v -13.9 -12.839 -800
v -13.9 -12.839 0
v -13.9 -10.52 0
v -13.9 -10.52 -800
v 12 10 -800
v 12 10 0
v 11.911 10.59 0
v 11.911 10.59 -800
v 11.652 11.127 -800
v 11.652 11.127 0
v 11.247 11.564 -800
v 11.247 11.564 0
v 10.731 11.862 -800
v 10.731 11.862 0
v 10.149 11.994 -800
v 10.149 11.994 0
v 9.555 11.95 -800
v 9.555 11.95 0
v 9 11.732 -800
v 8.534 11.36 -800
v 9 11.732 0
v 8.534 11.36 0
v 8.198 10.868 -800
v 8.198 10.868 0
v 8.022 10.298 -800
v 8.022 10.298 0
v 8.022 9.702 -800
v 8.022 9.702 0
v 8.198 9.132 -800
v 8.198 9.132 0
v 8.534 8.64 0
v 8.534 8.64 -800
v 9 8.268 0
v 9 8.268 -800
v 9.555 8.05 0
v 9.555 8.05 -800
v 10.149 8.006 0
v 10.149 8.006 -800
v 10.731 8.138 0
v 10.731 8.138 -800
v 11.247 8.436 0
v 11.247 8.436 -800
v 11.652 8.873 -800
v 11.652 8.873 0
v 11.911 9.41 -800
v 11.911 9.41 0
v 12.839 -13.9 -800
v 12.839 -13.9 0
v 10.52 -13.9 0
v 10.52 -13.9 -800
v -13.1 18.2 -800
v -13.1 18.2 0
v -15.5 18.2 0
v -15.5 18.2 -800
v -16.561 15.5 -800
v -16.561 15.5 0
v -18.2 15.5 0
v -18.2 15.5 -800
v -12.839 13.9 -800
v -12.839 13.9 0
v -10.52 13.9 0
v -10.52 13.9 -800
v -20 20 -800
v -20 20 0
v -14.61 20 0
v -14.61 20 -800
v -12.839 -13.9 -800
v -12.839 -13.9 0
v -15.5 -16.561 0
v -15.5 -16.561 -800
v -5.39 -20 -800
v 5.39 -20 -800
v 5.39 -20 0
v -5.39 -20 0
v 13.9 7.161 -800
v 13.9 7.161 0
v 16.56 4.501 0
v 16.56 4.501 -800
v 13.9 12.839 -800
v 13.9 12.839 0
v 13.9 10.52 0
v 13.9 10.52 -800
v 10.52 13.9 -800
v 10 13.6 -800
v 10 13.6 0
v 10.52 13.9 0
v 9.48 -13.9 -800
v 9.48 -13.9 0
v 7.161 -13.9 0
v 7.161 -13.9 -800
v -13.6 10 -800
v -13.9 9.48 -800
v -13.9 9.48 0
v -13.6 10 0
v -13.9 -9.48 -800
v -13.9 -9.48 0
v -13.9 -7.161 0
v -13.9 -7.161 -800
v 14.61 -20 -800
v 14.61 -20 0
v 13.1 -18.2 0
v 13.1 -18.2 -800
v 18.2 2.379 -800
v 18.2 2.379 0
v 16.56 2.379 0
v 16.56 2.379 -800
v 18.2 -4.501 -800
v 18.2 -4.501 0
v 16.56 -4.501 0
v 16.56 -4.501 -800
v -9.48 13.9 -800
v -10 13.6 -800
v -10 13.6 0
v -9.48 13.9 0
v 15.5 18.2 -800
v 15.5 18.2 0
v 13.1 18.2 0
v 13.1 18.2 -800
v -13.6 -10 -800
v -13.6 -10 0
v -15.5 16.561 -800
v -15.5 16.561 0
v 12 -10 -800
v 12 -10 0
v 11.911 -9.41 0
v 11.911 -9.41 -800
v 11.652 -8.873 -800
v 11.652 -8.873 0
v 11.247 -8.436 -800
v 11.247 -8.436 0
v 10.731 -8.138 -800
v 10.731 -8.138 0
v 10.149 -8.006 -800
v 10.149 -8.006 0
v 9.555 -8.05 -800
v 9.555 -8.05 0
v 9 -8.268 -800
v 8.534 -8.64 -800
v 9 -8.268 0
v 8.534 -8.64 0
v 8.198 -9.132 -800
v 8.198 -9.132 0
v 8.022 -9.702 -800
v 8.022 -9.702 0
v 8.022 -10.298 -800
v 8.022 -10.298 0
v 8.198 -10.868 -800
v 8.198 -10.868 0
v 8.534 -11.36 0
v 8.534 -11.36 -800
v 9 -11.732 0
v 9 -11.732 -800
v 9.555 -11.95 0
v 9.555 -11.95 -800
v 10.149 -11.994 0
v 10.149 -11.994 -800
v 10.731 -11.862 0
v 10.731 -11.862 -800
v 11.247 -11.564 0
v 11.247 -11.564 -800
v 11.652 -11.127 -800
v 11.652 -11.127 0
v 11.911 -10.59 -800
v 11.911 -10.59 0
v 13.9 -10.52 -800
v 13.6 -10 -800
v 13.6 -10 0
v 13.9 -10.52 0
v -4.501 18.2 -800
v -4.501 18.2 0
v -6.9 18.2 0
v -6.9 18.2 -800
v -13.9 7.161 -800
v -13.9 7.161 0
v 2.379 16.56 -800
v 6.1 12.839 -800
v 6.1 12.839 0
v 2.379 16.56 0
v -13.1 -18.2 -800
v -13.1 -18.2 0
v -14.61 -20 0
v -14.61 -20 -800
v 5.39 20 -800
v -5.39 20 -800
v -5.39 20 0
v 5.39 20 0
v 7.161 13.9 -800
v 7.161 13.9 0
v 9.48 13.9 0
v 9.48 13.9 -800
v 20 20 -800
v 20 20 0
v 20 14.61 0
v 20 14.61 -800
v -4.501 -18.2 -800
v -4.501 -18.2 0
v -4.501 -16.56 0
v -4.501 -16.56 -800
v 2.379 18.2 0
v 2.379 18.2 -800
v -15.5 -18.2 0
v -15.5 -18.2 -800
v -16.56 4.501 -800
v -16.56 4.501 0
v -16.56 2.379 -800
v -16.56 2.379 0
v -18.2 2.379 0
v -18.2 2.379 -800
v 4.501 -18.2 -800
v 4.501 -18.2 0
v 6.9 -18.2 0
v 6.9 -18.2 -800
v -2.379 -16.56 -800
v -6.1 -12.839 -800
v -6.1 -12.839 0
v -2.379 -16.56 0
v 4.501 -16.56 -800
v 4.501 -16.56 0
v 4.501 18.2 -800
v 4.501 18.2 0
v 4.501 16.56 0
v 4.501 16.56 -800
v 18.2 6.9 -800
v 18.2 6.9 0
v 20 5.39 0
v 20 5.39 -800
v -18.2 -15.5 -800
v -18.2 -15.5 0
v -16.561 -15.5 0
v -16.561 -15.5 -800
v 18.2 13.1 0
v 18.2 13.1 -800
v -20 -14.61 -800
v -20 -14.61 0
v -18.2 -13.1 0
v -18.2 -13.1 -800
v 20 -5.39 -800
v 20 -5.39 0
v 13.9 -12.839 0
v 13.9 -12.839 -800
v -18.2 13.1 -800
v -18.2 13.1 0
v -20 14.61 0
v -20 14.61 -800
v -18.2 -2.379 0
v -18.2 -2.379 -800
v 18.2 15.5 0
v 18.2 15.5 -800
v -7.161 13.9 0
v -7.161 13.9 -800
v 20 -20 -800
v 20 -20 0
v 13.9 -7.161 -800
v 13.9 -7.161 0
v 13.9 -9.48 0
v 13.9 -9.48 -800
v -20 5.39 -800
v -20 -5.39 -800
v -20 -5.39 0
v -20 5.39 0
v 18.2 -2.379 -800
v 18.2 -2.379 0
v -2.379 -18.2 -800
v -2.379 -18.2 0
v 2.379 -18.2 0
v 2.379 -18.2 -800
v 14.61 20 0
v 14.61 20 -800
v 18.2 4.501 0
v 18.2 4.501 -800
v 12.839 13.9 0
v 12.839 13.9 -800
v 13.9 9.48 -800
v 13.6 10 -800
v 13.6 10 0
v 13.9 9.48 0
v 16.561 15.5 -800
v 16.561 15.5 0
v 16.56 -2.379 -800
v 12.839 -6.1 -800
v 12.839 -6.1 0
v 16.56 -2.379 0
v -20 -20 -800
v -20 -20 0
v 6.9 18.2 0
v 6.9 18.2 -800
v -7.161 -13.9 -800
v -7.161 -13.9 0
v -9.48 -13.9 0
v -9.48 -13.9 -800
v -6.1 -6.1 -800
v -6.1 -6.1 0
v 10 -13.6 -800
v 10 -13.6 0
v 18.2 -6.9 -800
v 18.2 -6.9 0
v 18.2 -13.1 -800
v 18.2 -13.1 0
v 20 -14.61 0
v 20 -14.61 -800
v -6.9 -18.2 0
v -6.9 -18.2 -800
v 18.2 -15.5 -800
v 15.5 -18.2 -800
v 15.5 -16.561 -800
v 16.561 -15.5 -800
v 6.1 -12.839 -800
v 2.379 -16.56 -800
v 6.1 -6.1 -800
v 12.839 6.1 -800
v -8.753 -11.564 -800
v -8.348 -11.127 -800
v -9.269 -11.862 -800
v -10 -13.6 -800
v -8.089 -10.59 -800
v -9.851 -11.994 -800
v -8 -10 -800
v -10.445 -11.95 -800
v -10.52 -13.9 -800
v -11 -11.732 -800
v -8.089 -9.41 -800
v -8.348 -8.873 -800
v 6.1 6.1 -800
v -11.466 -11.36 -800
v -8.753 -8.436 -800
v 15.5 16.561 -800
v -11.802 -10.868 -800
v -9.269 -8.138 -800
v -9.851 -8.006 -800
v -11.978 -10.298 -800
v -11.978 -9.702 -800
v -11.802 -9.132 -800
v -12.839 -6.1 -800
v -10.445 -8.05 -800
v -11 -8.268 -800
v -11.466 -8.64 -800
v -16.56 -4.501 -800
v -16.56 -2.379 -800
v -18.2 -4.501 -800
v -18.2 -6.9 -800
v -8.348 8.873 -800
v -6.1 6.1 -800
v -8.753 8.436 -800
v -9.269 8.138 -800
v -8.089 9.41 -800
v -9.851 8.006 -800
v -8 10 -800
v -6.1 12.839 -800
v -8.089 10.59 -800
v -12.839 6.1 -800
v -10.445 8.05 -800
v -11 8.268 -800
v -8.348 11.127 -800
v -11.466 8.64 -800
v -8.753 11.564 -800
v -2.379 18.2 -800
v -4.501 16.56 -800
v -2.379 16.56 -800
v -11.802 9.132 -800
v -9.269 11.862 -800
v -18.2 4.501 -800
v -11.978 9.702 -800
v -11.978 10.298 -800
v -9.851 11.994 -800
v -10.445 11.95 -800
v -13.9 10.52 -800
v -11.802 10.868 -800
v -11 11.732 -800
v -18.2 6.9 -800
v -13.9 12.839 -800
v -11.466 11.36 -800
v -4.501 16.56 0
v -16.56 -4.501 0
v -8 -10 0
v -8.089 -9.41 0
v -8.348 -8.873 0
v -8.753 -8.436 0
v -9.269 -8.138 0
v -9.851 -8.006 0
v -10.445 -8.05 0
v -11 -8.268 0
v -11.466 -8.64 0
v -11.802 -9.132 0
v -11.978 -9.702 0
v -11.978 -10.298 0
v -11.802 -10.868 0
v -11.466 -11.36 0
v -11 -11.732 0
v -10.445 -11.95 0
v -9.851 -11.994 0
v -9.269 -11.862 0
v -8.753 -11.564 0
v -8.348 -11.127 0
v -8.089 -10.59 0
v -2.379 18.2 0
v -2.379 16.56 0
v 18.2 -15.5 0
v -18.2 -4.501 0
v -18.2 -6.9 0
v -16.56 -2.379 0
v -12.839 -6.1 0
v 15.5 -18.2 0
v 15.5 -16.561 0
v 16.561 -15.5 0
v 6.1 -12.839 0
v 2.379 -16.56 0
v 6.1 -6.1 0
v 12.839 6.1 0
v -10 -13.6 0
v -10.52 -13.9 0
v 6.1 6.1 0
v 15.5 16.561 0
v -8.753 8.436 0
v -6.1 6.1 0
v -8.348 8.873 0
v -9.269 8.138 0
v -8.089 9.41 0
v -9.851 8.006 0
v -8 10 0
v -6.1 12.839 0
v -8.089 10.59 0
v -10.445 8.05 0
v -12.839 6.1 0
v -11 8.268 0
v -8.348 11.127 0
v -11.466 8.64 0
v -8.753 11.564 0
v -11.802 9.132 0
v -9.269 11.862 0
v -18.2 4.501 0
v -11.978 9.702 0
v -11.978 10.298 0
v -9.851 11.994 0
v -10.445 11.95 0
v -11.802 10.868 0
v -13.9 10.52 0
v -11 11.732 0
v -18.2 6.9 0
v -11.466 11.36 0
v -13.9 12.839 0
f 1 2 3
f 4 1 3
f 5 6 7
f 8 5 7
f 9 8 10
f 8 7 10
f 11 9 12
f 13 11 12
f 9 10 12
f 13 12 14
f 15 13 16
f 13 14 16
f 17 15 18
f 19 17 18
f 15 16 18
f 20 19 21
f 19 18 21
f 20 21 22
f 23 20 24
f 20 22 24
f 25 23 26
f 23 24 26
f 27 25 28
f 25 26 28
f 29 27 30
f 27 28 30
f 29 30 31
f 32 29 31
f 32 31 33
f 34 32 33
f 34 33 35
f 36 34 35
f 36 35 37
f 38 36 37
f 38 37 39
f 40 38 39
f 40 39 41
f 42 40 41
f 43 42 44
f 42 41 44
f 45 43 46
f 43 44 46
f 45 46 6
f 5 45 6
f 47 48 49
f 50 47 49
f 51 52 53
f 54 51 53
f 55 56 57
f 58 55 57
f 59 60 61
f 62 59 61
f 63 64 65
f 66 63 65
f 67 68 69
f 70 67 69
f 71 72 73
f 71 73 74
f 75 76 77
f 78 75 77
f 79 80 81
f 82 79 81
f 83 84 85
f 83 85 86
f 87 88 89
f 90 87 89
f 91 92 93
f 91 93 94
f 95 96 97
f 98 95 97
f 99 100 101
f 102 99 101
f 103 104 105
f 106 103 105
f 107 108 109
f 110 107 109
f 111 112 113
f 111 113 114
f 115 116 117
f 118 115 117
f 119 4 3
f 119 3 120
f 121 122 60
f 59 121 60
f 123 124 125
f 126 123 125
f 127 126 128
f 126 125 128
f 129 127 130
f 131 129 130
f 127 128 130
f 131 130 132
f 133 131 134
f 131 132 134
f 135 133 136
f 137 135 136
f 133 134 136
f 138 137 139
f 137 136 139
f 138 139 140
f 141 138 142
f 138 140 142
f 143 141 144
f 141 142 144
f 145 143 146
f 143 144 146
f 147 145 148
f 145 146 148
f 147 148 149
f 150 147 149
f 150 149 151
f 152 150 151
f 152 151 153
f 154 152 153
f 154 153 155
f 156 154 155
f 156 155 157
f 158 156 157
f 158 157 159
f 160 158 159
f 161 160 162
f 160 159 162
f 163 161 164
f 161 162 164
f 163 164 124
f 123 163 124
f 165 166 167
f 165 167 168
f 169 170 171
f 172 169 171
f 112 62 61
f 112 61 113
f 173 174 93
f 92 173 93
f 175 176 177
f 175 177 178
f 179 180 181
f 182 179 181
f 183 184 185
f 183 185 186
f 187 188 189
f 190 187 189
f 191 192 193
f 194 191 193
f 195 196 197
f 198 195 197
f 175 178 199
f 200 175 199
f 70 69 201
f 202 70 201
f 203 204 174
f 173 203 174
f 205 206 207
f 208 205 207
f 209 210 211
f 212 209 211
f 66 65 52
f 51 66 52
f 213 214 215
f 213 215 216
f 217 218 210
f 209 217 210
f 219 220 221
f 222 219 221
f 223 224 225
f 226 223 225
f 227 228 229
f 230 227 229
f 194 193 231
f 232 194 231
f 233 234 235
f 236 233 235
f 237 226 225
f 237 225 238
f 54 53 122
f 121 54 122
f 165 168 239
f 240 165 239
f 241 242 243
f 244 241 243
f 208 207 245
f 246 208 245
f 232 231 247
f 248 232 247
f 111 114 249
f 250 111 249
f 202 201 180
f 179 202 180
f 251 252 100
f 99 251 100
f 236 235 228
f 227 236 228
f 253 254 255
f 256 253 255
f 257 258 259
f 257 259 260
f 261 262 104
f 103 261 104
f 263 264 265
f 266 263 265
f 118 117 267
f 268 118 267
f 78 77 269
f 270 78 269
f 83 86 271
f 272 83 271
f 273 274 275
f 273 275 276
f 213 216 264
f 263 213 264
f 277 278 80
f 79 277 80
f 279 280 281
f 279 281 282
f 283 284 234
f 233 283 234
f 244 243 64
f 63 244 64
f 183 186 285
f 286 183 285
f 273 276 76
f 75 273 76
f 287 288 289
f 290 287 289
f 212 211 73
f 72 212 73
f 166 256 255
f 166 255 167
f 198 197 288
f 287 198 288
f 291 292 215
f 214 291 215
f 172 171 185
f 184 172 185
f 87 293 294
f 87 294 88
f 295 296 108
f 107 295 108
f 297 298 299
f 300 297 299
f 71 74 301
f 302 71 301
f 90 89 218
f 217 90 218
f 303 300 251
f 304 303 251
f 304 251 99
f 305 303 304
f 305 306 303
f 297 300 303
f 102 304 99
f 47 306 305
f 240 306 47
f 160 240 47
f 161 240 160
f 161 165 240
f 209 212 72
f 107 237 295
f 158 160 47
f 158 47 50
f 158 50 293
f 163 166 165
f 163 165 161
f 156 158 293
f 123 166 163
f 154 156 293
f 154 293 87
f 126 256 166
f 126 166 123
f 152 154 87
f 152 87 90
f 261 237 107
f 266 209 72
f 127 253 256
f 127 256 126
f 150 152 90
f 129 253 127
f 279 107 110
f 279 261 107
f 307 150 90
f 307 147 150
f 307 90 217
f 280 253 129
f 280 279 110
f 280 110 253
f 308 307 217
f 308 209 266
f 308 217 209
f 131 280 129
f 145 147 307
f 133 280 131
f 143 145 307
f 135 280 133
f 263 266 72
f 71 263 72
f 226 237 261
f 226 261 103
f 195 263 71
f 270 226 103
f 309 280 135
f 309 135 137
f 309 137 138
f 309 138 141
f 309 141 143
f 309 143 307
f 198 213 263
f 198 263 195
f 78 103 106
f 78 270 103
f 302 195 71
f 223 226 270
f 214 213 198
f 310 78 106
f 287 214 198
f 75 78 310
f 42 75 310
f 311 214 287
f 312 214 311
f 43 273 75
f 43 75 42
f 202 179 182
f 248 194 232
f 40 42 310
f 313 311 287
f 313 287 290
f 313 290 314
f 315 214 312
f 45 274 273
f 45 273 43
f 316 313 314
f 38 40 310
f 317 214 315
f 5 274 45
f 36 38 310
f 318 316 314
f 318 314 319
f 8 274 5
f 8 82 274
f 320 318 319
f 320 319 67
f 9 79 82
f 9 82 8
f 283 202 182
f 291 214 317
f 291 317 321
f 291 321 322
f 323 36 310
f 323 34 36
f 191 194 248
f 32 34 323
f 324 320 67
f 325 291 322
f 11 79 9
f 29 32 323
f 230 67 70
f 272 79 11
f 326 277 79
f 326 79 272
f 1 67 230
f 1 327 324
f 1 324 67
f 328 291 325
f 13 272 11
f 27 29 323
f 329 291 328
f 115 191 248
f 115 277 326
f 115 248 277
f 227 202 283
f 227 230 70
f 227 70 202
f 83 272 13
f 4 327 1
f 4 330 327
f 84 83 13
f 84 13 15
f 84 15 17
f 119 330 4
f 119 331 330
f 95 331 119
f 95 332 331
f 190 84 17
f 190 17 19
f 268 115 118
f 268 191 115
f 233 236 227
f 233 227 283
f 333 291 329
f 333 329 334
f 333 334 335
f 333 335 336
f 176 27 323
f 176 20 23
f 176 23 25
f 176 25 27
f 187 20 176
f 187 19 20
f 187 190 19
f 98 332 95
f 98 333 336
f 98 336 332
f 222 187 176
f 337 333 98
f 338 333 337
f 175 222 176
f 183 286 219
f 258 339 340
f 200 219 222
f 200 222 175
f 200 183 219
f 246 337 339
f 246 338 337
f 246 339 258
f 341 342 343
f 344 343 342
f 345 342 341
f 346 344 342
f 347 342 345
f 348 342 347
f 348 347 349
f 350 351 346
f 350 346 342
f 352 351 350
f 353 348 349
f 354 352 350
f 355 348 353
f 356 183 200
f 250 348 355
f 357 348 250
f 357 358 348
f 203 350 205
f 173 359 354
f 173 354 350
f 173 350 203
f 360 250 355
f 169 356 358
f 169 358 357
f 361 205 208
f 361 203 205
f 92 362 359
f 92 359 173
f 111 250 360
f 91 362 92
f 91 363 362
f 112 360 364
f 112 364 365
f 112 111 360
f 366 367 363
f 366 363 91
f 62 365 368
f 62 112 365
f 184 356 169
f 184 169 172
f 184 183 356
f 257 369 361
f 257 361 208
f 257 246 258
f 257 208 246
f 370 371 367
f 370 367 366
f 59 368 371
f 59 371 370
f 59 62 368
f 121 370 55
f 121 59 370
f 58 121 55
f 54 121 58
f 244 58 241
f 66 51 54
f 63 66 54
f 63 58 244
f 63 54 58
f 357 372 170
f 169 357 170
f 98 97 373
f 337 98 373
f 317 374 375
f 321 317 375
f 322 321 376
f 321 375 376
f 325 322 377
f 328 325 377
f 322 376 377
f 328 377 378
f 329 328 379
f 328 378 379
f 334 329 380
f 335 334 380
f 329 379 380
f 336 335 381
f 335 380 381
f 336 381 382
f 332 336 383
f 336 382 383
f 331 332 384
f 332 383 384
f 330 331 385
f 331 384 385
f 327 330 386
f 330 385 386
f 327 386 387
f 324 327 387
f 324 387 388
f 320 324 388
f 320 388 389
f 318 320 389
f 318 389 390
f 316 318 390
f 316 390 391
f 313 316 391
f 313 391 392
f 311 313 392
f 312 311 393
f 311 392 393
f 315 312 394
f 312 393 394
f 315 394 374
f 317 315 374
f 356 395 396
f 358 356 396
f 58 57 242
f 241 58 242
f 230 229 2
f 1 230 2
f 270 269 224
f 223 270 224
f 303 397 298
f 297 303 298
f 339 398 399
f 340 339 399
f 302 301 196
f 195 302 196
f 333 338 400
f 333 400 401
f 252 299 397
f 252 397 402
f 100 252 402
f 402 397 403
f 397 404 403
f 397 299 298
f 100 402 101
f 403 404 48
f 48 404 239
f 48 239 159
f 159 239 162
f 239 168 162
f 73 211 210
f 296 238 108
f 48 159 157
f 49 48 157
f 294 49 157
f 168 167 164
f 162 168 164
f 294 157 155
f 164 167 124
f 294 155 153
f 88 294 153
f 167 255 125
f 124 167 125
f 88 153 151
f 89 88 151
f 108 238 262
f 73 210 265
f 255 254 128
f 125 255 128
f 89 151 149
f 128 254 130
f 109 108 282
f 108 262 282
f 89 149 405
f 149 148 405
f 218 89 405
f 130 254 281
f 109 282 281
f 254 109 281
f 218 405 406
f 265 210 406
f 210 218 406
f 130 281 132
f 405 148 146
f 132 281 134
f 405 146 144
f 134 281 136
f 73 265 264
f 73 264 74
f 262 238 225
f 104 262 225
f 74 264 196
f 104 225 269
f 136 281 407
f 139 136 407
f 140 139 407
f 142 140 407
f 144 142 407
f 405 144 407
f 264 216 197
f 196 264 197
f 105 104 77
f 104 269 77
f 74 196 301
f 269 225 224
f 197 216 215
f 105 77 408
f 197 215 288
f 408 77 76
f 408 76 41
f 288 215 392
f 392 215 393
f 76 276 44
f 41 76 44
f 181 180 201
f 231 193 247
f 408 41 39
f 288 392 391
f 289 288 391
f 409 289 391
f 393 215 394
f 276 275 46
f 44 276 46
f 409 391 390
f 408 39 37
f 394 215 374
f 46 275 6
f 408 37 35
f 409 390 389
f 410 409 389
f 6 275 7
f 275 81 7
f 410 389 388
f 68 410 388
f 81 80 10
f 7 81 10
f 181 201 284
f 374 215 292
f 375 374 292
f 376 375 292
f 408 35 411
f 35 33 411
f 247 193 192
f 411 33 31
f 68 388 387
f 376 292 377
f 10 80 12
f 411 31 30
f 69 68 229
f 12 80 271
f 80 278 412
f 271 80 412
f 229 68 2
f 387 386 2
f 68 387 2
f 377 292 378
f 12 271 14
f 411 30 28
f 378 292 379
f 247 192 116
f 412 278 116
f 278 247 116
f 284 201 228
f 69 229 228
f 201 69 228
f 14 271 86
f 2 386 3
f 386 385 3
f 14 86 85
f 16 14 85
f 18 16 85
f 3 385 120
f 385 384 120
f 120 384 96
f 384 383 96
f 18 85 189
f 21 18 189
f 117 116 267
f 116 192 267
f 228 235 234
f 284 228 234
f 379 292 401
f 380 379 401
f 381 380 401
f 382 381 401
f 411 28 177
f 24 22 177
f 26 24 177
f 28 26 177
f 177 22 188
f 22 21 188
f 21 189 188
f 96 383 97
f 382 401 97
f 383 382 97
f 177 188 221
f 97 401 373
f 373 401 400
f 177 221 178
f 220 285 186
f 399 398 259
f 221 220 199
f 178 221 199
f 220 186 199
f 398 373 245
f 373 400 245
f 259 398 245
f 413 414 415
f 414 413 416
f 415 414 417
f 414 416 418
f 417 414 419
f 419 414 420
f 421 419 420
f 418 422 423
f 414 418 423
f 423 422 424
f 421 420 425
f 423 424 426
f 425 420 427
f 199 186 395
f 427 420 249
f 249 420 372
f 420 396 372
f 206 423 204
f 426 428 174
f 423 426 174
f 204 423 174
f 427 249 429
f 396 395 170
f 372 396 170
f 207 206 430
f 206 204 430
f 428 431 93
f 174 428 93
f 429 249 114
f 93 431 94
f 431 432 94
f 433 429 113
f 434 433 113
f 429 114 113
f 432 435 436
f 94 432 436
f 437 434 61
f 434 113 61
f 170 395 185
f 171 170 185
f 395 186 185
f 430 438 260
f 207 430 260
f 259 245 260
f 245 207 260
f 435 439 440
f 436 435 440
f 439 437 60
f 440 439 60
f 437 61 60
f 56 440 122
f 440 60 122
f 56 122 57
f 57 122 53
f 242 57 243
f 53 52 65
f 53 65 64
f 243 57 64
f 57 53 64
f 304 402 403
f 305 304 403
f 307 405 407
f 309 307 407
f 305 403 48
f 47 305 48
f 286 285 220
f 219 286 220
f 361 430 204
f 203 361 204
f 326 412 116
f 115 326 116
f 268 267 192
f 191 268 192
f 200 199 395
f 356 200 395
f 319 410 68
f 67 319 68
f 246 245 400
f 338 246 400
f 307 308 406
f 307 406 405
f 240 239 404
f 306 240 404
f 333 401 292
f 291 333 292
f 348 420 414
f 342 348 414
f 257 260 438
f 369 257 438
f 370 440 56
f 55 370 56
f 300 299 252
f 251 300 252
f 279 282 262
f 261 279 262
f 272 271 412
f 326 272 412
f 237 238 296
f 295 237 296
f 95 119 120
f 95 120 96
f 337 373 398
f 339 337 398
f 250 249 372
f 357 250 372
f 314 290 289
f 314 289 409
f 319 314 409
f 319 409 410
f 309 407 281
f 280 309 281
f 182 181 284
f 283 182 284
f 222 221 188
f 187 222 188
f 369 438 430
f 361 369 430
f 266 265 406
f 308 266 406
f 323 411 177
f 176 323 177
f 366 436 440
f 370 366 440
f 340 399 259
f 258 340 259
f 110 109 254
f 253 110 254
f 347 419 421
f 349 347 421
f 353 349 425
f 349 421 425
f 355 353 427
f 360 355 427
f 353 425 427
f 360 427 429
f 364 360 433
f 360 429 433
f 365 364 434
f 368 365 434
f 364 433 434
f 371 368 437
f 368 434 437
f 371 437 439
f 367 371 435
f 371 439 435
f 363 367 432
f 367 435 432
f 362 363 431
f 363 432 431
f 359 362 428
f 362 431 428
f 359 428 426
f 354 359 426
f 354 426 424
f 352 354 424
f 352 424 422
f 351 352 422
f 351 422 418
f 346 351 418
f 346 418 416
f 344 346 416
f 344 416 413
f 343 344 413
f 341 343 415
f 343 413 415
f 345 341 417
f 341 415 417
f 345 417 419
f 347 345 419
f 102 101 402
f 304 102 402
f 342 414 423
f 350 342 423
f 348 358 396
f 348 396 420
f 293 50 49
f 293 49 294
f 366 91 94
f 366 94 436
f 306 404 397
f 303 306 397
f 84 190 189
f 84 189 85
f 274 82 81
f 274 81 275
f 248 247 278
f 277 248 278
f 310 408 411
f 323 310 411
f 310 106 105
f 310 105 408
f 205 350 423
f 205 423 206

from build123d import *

# Parameters (mm, degrees)
SKETCH2_R           = 2
BOSS_EXTRUDE1_DEPTH = 800


with BuildPart() as part:
    # Sketch2 → Boss-Extrude1 (new body)
    with BuildSketch(Plane.XY):
        Polygon((-13.9, -12.839339828), (-13.9, -10.519615242), (-13.6, -10), (-13.9, -9.480384758), (-13.9, -7.160660172), (-16.56, -4.500660172), (-18.2, -4.500660172), (-18.2, -6.900379336), (-20, -5.39), (-20, 5.39), (-18.2, 6.900379336), (-18.2, 4.500660172), (-16.56, 4.500660172), (-13.9, 7.160660172), (-13.9, 9.480384758), (-13.6, 10), (-13.9, 10.519615242), (-13.9, 12.839339828), (-16.560660172, 15.5), (-18.2, 15.5), (-18.2, 13.099620664), (-20, 14.61), (-20, 20), (-14.61, 20), (-13.099620664, 18.2), (-15.5, 18.2), (-15.5, 16.560660172), (-12.839339828, 13.9), (-10.519615242, 13.9), (-10, 13.6), (-9.480384758, 13.9), (-7.160660172, 13.9), (-4.500660172, 16.56), (-4.500660172, 18.2), (-6.900379336, 18.2), (-5.39, 20), (5.39, 20), (6.900379336, 18.2), (4.500660172, 18.2), (4.500660172, 16.56), (7.160660172, 13.9), (9.480384758, 13.9), (10, 13.6), (10.519615242, 13.9), (12.839339828, 13.9), (15.5, 16.560660172), (15.5, 18.2), (13.099620664, 18.2), (14.61, 20), (20, 20), (20, 14.61), (18.2, 13.099620664), (18.2, 15.5), (16.560660172, 15.5), (13.9, 12.839339828), (13.9, 10.519615242), (13.6, 10), (13.9, 9.480384758), (13.9, 7.160660172), (16.56, 4.500660172), (18.2, 4.500660172), (18.2, 6.900379336), (20, 5.39), (20, -5.39), (18.2, -6.900379336), (18.2, -4.500660172), (16.56, -4.500660172), (13.9, -7.160660172), (13.9, -9.480384758), (13.6, -10), (13.9, -10.519615242), (13.9, -12.839339828), (16.560660172, -15.5), (18.2, -15.5), (18.2, -13.099620664), (20, -14.61), (20, -20), (14.61, -20), (13.099620664, -18.2), (15.5, -18.2), (15.5, -16.560660172), (12.839339828, -13.9), (10.519615242, -13.9), (10, -13.6), (9.480384758, -13.9), (7.160660172, -13.9), (4.500660172, -16.56), (4.500660172, -18.2), (6.900379336, -18.2), (5.39, -20), (-5.39, -20), (-6.900379336, -18.2), (-4.500660172, -18.2), (-4.500660172, -16.56), (-7.160660172, -13.9), (-9.480384758, -13.9), (-10, -13.6), (-10.519615242, -13.9), (-12.839339828, -13.9), (-15.5, -16.560660172), (-15.5, -18.2), (-13.099620664, -18.2), (-14.61, -20), (-20, -20), (-20, -14.61), (-18.2, -13.099620664), (-18.2, -15.5), (-16.560660172, -15.5), align=None)
        with Locations((-10, -10)):
            Circle(SKETCH2_R, mode=Mode.SUBTRACT)
        with Locations((10, -10)):
            Circle(SKETCH2_R, mode=Mode.SUBTRACT)
        with Locations((10, 10)):
            Circle(SKETCH2_R, mode=Mode.SUBTRACT)
        with Locations((-10, 10)):
            Circle(SKETCH2_R, mode=Mode.SUBTRACT)
        Polygon((-12.839339828, -6.1), (-6.1, -6.1), (-6.1, -12.839339828), (-2.379339828, -16.56), (-2.379339828, -18.2), (2.379339828, -18.2), (2.379339828, -16.56), (6.1, -12.839339828), (6.1, -6.1), (12.839339828, -6.1), (16.56, -2.379339828), (18.2, -2.379339828), (18.2, 2.379339828), (16.56, 2.379339828), (12.839339828, 6.1), (6.1, 6.1), (6.1, 12.839339828), (2.379339828, 16.56), (2.379339828, 18.2), (-2.379339828, 18.2), (-2.379339828, 16.56), (-6.1, 12.839339828), (-6.1, 6.1), (-12.839339828, 6.1), (-16.56, 2.379339828), (-18.2, 2.379339828), (-18.2, -2.379339828), (-16.56, -2.379339828), align=None, mode=Mode.SUBTRACT)
    extrude(amount=-BOSS_EXTRUDE1_DEPTH)


solid = part.part
